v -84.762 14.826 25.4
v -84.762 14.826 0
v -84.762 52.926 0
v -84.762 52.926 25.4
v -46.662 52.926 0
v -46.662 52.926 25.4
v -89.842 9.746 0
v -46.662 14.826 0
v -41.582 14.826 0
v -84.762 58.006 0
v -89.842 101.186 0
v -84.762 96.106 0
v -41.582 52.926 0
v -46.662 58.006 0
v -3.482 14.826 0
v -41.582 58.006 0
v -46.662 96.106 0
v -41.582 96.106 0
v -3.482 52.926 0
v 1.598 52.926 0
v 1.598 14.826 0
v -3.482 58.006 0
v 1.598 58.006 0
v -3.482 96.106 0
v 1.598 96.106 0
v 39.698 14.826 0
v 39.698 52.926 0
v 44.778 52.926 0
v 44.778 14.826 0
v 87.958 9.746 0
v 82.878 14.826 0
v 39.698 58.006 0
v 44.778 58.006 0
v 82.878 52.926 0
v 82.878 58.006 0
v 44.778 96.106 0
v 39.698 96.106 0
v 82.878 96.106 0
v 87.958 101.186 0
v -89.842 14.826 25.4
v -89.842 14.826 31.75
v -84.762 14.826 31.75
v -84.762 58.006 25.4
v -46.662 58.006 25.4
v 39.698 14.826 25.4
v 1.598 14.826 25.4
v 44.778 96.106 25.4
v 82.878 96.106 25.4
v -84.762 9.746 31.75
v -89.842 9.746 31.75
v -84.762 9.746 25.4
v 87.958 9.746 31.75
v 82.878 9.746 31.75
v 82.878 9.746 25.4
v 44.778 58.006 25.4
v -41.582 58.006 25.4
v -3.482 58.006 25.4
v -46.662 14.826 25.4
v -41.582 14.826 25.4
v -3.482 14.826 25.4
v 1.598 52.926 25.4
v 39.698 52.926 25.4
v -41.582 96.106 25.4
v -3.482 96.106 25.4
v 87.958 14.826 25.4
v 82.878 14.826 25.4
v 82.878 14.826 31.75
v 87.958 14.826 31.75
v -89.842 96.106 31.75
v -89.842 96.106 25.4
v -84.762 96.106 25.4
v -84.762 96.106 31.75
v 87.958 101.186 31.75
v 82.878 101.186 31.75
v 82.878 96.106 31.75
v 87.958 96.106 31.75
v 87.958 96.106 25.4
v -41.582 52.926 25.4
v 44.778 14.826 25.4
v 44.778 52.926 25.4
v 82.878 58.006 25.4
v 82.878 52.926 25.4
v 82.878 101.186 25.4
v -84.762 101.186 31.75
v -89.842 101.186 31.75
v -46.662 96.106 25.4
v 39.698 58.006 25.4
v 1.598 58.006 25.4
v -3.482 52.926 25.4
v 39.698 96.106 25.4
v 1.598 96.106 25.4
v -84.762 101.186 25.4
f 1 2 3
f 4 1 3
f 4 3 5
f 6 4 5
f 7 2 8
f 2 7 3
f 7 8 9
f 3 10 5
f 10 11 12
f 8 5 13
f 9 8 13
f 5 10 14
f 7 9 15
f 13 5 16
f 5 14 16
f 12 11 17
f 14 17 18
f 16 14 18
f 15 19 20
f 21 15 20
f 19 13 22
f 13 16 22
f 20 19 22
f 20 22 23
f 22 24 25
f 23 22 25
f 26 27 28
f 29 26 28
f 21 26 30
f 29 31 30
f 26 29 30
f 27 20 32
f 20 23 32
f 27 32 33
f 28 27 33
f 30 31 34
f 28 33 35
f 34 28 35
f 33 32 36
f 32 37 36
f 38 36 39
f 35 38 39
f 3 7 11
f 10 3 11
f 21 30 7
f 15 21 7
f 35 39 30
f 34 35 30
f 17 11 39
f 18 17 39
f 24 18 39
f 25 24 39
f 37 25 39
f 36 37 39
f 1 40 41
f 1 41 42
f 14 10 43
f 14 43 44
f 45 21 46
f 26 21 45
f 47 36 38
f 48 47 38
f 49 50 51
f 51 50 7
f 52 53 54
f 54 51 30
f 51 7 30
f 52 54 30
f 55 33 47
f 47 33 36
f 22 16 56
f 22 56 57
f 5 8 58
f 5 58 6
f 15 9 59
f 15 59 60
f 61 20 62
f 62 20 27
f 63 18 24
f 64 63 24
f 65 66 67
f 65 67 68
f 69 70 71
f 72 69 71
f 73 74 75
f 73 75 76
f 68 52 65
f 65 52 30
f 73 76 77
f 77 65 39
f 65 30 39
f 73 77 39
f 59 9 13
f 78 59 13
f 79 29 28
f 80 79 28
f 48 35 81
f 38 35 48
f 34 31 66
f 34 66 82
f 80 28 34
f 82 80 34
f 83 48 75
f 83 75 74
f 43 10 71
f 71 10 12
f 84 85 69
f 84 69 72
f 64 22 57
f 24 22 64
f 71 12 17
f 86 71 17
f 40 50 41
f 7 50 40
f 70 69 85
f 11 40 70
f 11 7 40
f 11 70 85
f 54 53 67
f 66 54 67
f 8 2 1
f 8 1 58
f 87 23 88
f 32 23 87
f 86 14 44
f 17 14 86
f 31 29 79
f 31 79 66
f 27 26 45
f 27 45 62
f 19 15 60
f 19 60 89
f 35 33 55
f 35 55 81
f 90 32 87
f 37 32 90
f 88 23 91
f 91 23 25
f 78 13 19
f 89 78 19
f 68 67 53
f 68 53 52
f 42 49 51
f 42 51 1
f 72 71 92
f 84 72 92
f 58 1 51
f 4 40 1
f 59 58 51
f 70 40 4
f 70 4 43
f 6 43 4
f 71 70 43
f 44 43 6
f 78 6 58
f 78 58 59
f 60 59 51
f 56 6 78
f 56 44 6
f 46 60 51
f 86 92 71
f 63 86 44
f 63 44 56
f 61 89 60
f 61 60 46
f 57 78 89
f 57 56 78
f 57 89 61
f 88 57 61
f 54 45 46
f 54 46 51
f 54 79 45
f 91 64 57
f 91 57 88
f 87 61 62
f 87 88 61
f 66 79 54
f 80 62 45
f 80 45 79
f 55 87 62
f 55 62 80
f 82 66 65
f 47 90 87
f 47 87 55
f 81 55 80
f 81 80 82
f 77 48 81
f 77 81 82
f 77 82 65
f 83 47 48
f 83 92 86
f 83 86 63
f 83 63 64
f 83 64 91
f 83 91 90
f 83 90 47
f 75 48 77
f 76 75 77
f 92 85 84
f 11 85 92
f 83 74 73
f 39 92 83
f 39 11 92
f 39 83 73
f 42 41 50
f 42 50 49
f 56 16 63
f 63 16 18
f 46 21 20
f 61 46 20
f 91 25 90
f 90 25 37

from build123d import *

# Parameters (mm, degrees)
F0_W     = 177.8
F0_H     = 91.44
F0_W_2   = 38.1
F0_H_2   = 38.1
F1_DEPTH = 25.4
F2_W     = 5.08
F2_H     = 5.08
F3_DEPTH = 6.35


with BuildPart() as f1:
    # F0 (on Top) → F1 (new body)
    with BuildSketch(Plane.XY):
        with Locations((-0.942165, 55.466111)):
            Rectangle(F0_W, F0_H)
        with Locations((-65.712165, 33.876111)):
            Rectangle(F0_W_2, F0_H_2, mode=Mode.SUBTRACT)
        with Locations((-22.532165, 33.876111)):
            Rectangle(F0_W_2, F0_H_2, mode=Mode.SUBTRACT)
        with Locations((20.647835, 33.876111)):
            Rectangle(F0_W_2, F0_H_2, mode=Mode.SUBTRACT)
        with Locations((63.827835, 33.876111)):
            Rectangle(F0_W_2, F0_H_2, mode=Mode.SUBTRACT)
        with Locations((-65.712165, 77.056111)):
            Rectangle(F0_W_2, F0_H_2, mode=Mode.SUBTRACT)
        with Locations((-22.532165, 77.056111)):
            Rectangle(F0_W_2, F0_H_2, mode=Mode.SUBTRACT)
        with Locations((20.647835, 77.056111)):
            Rectangle(F0_W_2, F0_H_2, mode=Mode.SUBTRACT)
        with Locations((63.827835, 77.056111)):
            Rectangle(F0_W_2, F0_H_2, mode=Mode.SUBTRACT)
    extrude(amount=F1_DEPTH)

    # F2 (on face) → F3 (join)
    with BuildSketch(Plane.XY.offset(25.4)):
        with Locations((-87.302165, 98.646111)):
            Rectangle(F2_W, F2_H)
        with Locations((-87.302165, 12.286111)):
            Rectangle(F2_W, F2_H)
        with Locations((85.417835, 12.286111)):
            Rectangle(F2_W, F2_H)
        with Locations((85.417835, 98.646111)):
            Rectangle(F2_W, F2_H)
    extrude(amount=F3_DEPTH)


solid = f1.part
